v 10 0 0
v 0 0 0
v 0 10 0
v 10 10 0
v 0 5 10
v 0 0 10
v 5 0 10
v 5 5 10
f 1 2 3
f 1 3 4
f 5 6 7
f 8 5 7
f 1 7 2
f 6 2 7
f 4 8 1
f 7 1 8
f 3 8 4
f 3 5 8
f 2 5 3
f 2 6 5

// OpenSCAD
// The contrast to ext_linear_scale_nonuniform: a uniform scale keeps every wall
// planar, so nothing is refined and the frustum stays at 12 triangles however
// far the scale is from 1.
//
// oracle: tris
linear_extrude(height=10, scale=0.5) square(10);
